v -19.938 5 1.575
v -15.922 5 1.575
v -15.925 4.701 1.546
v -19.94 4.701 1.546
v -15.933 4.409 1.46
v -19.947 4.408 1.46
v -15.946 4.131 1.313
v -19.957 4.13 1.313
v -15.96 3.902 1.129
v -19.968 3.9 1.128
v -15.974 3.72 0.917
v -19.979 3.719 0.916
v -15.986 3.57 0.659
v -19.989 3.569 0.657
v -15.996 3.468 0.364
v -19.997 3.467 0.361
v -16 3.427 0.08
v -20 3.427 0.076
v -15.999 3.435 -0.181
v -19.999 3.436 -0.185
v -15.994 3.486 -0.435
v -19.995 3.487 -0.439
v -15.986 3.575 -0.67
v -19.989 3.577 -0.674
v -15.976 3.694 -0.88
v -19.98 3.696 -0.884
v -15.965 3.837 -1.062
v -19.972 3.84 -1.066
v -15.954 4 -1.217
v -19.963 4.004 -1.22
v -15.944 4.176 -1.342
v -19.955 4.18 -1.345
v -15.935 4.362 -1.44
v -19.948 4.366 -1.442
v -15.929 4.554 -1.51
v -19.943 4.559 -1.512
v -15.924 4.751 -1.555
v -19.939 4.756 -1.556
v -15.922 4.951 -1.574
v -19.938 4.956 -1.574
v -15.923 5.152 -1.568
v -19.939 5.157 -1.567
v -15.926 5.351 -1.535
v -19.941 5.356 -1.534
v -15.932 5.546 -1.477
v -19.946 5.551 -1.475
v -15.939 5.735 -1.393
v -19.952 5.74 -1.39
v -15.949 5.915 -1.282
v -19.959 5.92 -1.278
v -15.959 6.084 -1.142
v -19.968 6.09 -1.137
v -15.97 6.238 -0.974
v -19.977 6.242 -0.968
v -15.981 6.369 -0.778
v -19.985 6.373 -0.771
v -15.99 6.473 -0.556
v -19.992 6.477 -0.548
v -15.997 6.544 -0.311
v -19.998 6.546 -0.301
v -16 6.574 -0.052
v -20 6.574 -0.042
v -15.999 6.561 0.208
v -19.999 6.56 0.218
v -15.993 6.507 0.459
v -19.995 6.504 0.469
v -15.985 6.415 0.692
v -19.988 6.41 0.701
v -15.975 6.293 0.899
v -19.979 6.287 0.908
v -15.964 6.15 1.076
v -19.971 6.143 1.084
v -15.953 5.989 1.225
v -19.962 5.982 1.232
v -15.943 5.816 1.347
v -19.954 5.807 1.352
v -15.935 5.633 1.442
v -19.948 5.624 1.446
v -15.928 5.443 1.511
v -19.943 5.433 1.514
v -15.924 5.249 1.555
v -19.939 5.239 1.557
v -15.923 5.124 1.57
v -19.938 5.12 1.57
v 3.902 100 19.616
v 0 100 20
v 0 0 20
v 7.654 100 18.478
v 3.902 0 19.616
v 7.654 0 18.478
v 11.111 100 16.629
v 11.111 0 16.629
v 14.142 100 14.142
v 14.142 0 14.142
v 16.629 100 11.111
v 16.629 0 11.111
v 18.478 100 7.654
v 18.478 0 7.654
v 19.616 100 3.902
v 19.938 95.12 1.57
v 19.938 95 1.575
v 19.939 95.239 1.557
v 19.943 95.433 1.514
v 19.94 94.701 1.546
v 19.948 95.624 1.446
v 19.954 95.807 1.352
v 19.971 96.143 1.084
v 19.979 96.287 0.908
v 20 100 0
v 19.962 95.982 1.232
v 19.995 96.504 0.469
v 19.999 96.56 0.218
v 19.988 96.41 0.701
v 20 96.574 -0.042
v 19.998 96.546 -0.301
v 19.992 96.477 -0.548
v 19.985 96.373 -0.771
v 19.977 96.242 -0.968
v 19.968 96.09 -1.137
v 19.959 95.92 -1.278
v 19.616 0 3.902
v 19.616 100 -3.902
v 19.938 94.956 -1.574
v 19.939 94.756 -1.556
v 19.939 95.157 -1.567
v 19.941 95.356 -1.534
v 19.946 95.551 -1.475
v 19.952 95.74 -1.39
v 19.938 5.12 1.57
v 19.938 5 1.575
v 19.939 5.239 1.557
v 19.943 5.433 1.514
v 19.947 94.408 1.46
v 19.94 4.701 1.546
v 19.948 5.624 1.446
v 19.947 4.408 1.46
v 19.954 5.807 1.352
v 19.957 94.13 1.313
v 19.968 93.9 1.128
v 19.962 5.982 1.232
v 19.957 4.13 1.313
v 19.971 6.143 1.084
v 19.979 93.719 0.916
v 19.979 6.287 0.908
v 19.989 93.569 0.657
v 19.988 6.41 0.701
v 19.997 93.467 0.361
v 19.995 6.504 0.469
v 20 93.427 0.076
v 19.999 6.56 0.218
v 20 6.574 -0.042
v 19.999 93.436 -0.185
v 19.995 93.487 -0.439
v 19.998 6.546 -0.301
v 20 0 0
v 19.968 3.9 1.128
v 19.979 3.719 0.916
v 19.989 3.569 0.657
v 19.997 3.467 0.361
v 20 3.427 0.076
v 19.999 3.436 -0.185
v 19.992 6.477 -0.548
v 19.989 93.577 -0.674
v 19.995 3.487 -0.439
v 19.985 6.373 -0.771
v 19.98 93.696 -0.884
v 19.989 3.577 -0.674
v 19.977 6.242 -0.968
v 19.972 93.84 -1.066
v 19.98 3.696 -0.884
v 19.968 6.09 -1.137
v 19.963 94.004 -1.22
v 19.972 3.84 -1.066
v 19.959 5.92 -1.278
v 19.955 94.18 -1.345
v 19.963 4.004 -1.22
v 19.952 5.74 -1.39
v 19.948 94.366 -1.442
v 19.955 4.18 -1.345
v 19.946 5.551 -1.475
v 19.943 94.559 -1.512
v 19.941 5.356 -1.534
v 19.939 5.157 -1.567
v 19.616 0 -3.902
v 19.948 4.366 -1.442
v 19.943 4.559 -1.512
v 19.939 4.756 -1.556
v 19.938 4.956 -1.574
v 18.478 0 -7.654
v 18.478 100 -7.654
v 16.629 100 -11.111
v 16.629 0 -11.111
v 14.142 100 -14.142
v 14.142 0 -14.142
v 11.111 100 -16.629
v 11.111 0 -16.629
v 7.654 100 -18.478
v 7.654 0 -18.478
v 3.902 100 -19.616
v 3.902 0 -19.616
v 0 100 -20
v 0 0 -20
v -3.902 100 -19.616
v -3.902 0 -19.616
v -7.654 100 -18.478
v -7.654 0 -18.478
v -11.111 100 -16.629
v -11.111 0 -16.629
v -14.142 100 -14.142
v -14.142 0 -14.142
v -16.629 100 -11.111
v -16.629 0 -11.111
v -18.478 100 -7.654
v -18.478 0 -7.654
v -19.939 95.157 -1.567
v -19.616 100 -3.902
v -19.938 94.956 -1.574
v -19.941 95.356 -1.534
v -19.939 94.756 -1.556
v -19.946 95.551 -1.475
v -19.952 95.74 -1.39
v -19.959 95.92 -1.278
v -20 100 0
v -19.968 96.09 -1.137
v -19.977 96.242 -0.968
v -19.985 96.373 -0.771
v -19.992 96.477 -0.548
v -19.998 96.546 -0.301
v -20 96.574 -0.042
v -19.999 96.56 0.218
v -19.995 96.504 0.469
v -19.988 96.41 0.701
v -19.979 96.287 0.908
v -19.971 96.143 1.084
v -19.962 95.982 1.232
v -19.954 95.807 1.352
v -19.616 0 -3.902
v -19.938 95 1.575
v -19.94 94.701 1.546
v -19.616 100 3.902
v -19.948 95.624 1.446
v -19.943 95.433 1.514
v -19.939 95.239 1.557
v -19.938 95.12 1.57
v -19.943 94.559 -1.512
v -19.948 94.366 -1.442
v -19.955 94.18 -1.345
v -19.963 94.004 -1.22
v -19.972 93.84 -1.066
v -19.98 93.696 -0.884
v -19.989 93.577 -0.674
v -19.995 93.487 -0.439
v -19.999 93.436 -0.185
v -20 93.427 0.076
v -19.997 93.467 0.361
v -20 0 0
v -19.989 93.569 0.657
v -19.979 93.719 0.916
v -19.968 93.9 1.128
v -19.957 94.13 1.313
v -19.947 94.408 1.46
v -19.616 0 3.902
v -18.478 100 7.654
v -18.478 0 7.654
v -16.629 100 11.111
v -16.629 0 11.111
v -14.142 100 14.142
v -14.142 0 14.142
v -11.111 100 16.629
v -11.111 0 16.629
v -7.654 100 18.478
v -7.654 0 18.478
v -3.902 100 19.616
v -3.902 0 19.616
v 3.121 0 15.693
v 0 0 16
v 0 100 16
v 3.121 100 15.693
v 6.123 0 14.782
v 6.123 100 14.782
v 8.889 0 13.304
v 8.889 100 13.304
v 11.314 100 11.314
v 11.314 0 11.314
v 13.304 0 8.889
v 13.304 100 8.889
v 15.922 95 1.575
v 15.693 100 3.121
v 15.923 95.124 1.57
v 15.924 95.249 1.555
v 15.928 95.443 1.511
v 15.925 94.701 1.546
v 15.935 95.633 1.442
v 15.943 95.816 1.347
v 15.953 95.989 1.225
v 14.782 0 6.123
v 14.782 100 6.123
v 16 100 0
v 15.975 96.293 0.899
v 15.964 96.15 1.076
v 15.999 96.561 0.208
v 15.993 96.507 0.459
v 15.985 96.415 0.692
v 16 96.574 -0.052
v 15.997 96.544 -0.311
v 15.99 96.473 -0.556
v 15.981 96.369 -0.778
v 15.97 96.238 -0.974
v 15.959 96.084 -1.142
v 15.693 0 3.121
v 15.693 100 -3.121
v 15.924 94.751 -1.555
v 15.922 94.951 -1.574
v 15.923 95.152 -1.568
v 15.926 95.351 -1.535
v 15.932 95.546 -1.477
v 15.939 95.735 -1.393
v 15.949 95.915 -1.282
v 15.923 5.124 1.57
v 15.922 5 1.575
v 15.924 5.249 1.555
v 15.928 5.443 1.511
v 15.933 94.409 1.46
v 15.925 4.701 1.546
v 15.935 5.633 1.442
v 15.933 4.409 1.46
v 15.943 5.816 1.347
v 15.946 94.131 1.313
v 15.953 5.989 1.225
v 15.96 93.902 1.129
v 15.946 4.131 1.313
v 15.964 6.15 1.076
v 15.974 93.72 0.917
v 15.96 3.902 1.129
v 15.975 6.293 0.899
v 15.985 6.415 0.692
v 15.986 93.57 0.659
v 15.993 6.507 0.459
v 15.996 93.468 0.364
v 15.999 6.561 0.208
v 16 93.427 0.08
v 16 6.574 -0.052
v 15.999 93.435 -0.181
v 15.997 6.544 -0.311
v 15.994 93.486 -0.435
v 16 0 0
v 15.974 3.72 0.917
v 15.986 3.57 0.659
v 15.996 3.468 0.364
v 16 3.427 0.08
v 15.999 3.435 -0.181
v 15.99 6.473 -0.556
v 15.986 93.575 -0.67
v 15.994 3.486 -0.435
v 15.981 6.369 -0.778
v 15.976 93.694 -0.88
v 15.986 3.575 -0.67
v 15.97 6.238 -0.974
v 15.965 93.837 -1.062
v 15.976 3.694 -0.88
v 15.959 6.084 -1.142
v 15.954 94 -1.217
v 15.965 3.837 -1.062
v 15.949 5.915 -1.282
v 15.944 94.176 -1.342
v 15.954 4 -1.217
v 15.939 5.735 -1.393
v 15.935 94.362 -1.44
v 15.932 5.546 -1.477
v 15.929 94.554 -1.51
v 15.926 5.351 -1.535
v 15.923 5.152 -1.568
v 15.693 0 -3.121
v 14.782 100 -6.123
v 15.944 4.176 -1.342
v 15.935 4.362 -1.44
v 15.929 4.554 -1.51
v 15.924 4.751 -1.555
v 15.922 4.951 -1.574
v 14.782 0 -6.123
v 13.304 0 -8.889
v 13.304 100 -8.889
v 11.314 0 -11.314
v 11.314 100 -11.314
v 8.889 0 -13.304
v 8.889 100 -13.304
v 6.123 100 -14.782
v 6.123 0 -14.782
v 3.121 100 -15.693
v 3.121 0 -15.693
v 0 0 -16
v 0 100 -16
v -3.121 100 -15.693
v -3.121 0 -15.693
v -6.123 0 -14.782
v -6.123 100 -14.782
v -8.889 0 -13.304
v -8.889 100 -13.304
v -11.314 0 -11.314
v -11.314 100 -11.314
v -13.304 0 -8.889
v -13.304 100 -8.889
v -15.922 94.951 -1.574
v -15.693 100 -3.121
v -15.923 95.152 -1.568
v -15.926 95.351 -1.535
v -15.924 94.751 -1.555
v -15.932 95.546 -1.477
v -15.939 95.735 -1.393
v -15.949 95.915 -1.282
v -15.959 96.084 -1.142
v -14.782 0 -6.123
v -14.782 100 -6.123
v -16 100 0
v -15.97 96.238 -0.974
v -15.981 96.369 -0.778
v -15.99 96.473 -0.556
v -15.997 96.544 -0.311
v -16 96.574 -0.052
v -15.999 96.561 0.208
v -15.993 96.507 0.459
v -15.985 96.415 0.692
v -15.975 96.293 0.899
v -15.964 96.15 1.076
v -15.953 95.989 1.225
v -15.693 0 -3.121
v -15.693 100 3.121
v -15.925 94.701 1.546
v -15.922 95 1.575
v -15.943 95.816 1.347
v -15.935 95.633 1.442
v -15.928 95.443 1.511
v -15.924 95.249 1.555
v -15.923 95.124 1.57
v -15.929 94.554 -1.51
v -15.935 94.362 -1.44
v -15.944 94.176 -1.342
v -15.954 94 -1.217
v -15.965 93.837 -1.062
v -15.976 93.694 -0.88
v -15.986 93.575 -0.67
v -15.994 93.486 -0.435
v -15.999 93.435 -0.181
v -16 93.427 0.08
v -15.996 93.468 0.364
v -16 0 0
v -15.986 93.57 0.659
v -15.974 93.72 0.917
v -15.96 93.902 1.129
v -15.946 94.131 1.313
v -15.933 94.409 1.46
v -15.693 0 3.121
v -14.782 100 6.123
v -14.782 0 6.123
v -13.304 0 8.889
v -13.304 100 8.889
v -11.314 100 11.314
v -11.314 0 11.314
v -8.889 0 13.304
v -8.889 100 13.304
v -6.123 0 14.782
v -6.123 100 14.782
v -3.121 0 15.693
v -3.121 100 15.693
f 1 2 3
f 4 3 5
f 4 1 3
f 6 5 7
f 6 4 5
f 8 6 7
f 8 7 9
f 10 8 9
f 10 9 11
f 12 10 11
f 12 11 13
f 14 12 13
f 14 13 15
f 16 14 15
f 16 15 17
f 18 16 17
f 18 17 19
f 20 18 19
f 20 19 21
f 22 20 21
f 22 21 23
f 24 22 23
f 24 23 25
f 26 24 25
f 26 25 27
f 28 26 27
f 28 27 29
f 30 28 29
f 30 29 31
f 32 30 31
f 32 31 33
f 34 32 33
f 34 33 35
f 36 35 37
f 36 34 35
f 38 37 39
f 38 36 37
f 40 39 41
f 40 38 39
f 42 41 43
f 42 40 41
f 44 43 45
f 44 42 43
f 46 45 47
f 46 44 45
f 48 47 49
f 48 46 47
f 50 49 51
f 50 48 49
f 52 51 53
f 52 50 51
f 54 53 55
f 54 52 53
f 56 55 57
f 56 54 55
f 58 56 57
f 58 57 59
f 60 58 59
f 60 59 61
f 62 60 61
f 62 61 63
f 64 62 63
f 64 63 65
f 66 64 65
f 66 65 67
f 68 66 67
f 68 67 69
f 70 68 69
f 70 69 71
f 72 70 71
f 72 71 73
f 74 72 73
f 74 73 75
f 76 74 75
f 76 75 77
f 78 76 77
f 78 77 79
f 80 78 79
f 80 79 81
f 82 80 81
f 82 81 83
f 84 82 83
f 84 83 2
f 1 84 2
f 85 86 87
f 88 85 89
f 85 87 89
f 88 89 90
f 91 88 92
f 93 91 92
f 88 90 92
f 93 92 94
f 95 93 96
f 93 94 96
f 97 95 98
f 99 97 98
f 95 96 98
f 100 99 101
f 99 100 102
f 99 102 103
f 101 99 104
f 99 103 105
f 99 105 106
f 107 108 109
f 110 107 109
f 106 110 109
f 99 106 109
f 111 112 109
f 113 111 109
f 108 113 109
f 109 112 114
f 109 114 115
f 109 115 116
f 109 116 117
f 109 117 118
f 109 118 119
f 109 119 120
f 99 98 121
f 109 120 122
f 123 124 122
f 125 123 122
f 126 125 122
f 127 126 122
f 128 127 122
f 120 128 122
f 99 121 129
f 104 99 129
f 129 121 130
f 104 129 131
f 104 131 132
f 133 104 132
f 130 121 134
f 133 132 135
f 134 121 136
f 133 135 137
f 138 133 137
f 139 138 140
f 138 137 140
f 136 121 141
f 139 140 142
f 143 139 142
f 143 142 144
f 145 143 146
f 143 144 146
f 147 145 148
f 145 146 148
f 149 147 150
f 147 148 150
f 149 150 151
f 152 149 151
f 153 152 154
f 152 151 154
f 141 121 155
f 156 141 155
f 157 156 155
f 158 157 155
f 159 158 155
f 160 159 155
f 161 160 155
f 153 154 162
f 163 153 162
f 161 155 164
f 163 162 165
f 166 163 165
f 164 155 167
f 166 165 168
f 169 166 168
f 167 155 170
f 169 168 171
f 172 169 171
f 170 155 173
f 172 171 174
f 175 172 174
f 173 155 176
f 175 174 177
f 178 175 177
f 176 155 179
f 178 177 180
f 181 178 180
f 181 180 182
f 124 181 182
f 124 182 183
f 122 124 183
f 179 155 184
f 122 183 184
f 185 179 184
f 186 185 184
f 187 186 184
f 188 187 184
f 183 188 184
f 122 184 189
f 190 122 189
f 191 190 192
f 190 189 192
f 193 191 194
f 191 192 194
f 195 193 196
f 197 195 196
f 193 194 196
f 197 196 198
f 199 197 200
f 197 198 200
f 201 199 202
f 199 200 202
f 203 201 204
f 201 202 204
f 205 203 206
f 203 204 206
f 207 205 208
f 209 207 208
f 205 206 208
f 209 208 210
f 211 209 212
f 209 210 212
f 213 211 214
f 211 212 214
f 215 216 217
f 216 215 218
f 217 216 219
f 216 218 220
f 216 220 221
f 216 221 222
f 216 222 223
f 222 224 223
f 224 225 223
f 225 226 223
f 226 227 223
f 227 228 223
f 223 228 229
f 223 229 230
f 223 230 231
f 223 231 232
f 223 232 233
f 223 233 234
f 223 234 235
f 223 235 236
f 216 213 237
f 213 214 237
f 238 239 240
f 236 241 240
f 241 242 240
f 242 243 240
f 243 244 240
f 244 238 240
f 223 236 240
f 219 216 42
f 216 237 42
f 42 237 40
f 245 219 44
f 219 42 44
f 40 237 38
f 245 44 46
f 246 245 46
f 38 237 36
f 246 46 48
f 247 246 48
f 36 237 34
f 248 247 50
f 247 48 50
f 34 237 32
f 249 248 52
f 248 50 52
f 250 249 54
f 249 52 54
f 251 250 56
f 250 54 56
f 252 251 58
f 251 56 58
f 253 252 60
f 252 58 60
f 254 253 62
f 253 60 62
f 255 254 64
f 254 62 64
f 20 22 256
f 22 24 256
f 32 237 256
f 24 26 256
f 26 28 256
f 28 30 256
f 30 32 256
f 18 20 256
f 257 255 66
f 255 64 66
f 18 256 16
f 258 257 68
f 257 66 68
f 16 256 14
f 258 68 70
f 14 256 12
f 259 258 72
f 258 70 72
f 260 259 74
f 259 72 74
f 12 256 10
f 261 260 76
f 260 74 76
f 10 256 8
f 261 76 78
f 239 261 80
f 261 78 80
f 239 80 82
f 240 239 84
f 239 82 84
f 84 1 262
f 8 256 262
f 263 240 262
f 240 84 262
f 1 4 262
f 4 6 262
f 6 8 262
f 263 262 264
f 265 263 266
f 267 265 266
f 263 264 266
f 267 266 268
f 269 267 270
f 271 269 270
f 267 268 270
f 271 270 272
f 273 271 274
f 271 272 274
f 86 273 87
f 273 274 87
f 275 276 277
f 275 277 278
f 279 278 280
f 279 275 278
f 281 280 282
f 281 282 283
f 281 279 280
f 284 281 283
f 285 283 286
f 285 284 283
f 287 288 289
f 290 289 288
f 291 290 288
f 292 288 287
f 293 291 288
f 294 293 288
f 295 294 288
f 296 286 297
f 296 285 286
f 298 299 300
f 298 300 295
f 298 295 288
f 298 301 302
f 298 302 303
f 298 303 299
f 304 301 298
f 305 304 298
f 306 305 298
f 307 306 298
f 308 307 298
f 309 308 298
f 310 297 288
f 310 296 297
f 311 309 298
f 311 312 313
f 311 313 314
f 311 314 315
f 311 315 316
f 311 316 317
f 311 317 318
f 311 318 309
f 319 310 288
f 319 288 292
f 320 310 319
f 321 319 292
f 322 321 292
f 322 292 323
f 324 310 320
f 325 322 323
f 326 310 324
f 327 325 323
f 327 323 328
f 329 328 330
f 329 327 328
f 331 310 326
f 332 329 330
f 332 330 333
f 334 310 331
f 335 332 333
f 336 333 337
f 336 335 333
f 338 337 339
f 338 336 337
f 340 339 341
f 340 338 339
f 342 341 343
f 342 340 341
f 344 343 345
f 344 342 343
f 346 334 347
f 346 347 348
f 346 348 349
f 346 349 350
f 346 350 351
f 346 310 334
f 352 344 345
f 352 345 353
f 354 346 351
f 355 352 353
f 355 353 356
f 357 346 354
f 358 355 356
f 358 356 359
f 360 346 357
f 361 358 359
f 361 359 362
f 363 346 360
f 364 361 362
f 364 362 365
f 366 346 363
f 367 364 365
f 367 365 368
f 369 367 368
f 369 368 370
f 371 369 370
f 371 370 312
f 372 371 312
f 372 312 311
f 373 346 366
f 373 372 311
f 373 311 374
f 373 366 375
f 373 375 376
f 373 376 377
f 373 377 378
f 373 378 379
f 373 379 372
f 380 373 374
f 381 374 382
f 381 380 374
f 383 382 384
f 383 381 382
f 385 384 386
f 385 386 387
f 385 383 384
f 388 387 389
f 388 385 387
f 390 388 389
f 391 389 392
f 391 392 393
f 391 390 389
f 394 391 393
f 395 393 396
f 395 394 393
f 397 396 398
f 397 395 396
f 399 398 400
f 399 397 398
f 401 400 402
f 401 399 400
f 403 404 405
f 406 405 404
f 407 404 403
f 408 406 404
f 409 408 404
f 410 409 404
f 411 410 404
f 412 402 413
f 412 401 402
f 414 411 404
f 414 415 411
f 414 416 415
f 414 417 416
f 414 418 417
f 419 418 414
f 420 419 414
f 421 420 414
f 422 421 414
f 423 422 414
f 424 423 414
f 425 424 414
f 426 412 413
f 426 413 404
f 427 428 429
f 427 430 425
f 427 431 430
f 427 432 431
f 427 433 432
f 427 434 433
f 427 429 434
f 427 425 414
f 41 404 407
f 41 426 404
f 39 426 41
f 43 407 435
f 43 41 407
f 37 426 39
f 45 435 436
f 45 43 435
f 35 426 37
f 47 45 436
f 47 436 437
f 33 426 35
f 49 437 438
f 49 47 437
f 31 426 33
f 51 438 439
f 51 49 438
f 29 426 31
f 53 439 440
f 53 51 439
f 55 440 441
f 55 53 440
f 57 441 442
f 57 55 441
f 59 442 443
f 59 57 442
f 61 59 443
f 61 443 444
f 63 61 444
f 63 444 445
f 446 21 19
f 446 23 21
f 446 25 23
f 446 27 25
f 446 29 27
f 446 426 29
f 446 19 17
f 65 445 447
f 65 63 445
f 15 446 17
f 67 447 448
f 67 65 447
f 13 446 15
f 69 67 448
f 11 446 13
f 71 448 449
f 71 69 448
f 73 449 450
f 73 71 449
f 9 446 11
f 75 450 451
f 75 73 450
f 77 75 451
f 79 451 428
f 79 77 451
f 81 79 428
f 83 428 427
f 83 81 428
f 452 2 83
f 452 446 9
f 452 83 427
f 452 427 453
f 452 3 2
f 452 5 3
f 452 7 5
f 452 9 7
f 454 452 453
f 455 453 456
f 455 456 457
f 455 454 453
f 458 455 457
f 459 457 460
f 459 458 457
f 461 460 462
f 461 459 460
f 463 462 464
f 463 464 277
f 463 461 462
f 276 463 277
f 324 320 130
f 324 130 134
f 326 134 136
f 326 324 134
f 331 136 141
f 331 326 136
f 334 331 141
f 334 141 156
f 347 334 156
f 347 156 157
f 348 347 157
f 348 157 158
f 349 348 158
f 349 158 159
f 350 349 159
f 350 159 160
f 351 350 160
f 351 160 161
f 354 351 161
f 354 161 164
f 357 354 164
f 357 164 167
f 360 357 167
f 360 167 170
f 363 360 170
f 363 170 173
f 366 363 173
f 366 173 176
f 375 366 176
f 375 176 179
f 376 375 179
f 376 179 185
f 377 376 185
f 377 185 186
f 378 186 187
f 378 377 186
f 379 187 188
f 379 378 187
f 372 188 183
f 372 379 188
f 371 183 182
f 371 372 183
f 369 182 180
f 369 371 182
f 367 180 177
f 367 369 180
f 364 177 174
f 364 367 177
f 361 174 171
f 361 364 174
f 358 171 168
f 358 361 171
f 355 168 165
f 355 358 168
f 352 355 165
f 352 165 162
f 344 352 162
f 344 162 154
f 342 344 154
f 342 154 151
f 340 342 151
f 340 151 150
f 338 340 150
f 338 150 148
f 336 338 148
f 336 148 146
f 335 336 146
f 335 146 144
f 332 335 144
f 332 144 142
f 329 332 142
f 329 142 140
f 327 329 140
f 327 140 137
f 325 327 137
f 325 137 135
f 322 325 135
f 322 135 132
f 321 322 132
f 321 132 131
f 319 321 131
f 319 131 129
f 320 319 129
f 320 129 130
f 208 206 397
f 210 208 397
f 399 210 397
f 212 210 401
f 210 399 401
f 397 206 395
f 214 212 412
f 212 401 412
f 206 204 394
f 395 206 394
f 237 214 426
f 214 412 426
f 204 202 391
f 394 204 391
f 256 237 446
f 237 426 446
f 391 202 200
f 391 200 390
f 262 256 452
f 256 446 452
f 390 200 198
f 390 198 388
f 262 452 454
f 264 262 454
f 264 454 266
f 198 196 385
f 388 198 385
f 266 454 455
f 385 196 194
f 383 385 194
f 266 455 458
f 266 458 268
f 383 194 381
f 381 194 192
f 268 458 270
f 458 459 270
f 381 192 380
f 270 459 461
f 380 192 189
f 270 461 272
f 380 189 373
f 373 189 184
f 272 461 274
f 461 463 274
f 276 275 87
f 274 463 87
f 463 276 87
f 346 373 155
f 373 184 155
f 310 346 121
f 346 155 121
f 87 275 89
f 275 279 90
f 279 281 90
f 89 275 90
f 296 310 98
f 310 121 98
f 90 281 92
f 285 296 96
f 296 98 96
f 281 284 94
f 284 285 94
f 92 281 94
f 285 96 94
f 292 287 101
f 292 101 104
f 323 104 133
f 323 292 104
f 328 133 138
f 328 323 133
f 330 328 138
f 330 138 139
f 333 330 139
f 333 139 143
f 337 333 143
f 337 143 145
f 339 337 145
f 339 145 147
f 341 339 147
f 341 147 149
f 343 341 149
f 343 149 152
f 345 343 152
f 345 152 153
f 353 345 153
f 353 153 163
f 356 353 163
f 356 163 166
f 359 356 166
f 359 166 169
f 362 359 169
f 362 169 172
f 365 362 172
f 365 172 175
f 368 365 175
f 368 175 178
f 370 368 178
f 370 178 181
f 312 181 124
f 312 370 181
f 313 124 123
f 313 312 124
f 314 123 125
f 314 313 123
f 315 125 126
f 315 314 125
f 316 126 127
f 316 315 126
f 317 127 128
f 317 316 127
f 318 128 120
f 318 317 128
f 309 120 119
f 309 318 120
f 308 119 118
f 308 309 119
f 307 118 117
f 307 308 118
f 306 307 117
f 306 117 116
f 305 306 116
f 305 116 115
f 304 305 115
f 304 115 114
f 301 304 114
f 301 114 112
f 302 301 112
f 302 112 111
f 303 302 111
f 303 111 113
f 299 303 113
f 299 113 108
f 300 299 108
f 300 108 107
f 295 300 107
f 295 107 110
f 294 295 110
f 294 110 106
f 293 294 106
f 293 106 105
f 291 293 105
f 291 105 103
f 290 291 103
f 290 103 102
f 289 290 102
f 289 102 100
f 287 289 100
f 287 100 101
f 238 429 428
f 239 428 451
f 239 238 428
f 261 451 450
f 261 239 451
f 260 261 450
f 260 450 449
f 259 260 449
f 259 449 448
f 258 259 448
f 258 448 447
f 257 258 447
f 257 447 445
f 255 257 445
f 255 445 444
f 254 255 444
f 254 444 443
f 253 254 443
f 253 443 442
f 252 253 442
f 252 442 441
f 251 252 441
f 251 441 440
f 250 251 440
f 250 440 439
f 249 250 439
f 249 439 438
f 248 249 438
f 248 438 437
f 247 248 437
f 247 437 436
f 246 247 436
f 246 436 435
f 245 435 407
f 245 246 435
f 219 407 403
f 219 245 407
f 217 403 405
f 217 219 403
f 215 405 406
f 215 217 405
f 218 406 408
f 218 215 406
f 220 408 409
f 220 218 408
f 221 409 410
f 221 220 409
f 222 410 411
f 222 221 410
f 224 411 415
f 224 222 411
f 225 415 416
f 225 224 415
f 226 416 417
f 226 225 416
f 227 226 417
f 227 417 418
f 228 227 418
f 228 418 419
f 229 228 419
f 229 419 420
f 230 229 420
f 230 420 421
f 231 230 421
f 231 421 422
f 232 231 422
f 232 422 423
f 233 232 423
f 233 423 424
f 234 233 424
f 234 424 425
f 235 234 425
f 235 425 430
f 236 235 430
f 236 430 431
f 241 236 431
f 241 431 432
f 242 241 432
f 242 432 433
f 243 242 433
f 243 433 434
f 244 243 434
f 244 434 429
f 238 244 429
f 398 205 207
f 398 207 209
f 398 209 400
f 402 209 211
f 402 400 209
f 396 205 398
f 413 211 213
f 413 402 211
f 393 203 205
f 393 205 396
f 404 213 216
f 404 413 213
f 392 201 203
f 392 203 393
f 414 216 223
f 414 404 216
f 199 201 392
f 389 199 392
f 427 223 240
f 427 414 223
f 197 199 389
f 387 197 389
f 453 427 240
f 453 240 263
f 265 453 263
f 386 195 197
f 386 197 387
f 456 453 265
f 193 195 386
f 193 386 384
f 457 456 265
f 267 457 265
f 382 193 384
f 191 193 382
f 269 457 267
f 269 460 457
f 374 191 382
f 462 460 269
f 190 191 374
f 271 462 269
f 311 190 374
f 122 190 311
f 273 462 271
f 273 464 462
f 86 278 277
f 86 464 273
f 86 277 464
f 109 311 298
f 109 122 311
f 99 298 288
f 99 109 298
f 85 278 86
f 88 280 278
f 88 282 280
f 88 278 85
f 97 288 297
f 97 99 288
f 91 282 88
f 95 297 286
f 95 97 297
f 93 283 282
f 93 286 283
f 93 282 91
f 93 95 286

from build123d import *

# Parameters (mm, degrees)
SKETCH1_R               = 20
SKETCH1_R_2             = 16
BOSS_EXTRUDE1_DEPTH     = 100
CUT_EXTRUDE1_DEPTH      = 52
CUT_EXTRUDE1_DEPTH_BACK = 46
SKETCH2_R               = 1.575


with BuildPart() as part:
    # Sketch1 → Boss-Extrude1 (new body)
    with BuildSketch(Plane(origin=(0, 0, 0), x_dir=(1, 0, 0), z_dir=(0, 1, 0))):
        with Locations(Location((0, 0, 0), (0, 0, 270))):
            Circle(SKETCH1_R)
        with Locations(Location((0, 0, 0), (0, 0, 270))):
            Circle(SKETCH1_R_2, mode=Mode.SUBTRACT)
    extrude(amount=BOSS_EXTRUDE1_DEPTH)

    # Sketch2 → Cut-Extrude1 (cut, two sides: drawn at the far end of the back side and taken through both)
    with BuildSketch(Plane(origin=(0, 0, 0), x_dir=(0, 0, -1), z_dir=(1, 0, 0)).offset(-CUT_EXTRUDE1_DEPTH_BACK)):
        with Locations(Location((0, 95, 0), (0, 0, 180))):
            Circle(SKETCH2_R)
        with Locations(Location((0, 5, 0), (0, 0, 180))):
            Circle(SKETCH2_R)
    extrude(amount=CUT_EXTRUDE1_DEPTH + CUT_EXTRUDE1_DEPTH_BACK, mode=Mode.SUBTRACT)


solid = part.part
